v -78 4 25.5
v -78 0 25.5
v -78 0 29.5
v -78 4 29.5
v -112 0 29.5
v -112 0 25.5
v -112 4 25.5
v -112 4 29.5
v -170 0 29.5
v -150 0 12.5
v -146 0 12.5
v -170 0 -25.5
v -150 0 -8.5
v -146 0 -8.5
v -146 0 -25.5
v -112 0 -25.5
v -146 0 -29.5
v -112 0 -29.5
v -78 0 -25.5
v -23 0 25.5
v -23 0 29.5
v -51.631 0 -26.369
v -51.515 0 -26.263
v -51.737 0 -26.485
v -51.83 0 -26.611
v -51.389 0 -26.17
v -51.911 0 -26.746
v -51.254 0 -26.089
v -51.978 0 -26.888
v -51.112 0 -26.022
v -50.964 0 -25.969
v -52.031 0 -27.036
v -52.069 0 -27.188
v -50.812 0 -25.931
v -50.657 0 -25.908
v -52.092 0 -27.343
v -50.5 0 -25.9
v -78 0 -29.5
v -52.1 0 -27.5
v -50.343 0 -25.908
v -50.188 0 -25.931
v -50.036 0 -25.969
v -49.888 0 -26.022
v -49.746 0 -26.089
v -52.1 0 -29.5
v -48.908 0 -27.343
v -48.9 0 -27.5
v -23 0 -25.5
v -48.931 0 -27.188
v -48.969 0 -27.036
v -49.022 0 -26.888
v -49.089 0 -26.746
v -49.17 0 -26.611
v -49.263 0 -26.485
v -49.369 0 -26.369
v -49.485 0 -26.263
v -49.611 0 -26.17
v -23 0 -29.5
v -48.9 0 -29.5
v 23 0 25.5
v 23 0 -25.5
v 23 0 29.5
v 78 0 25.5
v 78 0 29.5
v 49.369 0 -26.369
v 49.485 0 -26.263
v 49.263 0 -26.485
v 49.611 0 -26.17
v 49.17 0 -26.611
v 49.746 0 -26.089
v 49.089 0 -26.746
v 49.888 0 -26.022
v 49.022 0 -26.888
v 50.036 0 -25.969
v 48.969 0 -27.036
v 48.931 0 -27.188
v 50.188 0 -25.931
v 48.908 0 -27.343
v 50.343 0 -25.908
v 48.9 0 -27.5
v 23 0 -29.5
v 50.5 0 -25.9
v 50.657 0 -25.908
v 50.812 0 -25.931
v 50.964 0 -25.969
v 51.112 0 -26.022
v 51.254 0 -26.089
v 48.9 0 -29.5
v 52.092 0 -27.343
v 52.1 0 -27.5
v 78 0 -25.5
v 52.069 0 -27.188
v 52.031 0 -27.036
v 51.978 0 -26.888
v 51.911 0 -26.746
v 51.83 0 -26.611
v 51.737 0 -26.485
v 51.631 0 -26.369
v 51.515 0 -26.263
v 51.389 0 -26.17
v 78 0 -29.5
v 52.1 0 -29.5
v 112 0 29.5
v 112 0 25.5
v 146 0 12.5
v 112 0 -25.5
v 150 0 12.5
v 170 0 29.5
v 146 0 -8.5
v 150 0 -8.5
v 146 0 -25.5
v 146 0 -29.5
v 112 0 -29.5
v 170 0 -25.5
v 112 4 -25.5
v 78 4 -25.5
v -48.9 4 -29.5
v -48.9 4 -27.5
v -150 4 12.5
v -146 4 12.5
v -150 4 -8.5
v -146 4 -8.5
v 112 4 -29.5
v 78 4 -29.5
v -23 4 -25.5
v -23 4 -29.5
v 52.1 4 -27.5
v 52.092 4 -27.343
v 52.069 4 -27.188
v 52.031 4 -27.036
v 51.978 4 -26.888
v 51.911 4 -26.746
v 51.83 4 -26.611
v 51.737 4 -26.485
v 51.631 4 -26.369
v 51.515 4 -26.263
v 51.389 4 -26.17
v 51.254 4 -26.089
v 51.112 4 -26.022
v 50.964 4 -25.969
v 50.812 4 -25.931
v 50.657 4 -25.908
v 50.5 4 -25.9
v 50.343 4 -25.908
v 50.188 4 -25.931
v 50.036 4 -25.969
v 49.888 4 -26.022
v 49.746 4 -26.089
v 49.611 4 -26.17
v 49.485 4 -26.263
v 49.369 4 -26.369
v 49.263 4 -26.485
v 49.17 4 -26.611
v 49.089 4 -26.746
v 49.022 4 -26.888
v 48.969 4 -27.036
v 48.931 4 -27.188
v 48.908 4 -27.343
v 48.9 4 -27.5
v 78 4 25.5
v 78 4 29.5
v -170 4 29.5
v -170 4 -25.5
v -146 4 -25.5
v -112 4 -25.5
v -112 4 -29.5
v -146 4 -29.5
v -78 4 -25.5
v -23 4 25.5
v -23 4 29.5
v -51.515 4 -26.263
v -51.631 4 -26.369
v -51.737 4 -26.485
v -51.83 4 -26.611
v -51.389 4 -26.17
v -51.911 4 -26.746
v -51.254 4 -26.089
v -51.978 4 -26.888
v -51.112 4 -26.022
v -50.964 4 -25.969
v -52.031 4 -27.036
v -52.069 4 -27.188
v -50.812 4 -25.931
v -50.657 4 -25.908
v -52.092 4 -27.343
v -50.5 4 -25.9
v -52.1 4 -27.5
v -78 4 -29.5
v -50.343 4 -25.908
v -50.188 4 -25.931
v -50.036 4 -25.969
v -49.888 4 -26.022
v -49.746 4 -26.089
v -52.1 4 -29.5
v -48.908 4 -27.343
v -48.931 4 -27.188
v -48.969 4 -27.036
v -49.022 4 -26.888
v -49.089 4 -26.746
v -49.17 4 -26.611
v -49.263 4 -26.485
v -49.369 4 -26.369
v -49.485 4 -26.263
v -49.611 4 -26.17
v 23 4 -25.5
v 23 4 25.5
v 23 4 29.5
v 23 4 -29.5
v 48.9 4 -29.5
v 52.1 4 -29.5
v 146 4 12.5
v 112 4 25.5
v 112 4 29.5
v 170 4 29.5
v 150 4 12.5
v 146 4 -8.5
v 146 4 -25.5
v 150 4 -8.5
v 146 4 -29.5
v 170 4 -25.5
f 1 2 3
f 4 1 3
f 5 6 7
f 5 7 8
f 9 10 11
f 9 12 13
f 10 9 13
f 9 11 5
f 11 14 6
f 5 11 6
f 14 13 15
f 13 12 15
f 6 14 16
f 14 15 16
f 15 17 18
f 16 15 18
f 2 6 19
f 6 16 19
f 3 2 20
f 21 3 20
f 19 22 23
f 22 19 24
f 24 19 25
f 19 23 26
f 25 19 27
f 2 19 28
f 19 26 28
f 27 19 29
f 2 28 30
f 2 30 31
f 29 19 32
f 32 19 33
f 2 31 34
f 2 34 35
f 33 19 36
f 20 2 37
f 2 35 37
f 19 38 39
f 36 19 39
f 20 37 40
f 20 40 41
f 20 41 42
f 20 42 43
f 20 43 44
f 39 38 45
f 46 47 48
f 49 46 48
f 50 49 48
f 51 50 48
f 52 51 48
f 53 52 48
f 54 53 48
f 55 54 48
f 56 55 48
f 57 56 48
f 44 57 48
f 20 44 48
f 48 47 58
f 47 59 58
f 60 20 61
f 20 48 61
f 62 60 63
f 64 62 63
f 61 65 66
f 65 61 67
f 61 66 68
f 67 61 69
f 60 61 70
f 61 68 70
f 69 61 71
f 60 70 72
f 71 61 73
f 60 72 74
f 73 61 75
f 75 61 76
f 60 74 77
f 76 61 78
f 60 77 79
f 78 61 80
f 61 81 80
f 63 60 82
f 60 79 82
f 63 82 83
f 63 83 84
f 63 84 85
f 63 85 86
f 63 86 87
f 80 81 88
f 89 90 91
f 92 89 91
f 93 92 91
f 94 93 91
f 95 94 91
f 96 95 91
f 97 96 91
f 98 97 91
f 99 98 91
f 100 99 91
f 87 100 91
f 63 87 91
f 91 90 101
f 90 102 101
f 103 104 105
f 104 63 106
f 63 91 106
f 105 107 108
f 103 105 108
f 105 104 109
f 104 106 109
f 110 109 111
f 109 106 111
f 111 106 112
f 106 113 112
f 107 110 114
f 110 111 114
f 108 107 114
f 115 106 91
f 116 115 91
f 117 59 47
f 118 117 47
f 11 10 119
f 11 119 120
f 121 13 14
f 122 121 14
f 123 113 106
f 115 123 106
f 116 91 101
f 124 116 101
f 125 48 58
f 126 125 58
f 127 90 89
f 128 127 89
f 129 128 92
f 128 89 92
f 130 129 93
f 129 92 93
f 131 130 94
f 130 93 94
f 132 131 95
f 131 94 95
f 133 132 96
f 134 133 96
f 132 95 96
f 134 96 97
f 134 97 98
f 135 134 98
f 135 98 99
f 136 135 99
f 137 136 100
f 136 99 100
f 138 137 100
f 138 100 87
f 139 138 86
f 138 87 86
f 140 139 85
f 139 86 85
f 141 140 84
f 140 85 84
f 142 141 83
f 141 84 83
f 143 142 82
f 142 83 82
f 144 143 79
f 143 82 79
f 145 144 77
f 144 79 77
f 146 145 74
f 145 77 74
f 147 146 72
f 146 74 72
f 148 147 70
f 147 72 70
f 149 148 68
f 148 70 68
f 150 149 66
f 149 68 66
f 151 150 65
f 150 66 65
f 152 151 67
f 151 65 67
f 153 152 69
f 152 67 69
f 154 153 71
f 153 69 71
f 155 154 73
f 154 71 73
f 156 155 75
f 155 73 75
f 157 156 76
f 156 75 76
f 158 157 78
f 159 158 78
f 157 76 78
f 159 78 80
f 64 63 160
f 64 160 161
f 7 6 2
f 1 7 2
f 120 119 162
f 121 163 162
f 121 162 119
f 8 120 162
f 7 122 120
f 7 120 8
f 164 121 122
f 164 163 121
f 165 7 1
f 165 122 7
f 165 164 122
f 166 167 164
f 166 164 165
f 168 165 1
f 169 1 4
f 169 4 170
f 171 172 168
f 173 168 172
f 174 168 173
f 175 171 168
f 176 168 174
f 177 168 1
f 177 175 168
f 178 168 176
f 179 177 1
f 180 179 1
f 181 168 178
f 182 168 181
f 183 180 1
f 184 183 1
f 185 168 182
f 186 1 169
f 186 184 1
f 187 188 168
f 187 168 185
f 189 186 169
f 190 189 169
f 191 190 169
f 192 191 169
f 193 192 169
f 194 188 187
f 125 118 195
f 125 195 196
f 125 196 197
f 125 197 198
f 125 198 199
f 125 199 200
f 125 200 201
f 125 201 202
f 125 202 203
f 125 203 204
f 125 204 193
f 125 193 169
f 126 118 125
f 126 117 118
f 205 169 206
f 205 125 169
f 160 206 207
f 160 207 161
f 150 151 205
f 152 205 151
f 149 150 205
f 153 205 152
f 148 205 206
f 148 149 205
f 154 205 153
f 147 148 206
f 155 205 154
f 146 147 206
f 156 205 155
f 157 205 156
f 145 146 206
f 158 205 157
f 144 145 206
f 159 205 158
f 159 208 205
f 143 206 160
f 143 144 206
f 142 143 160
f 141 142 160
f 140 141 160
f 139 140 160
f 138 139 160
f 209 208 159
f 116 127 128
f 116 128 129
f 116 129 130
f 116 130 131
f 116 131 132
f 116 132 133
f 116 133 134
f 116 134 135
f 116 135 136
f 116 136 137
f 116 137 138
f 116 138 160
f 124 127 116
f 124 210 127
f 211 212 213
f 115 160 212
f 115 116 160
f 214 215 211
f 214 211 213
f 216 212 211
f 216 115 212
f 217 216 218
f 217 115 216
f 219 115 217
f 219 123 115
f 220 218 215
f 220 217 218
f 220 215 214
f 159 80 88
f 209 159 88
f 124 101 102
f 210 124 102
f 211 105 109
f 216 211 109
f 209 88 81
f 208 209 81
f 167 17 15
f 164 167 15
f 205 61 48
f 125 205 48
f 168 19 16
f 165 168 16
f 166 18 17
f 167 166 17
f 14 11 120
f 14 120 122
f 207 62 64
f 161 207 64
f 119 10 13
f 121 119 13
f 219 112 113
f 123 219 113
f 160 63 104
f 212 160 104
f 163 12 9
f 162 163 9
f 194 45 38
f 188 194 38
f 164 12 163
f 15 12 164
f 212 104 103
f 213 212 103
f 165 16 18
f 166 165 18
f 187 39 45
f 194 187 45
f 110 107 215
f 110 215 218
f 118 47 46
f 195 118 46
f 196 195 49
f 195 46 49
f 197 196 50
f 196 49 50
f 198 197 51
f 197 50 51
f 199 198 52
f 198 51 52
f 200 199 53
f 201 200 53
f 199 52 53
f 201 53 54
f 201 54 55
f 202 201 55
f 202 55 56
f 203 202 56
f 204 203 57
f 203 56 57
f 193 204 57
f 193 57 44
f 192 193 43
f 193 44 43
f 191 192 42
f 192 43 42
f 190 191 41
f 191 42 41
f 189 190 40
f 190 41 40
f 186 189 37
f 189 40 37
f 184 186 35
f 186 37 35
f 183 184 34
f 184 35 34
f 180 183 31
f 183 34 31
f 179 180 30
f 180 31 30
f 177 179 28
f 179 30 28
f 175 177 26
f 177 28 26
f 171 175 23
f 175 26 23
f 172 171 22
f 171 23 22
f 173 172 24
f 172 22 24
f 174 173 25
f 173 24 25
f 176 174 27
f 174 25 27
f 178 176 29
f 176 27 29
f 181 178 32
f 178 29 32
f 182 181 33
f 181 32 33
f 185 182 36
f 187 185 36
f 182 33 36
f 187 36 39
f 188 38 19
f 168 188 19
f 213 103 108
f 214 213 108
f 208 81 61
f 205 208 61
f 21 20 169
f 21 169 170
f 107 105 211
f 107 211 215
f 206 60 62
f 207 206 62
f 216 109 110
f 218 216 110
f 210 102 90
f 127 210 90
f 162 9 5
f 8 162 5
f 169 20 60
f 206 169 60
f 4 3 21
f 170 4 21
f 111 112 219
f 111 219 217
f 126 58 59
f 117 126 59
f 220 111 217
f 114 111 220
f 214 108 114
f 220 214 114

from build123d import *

# Parameters (mm, degrees)
SKETCH1_W           = 4
SKETCH1_H           = 21
BOSS_EXTRUDE1_DEPTH = 4
CUT_EXTRUDE1_REACH  = 174.587
SKETCH3_W           = 34
SKETCH3_H           = 4
SKETCH3_W_2         = 46
SKETCH3_W_3         = 24


with BuildPart() as part:
    # Sketch1 → Boss-Extrude1 (new body)
    with BuildSketch(Plane(origin=(0, 0, 0), x_dir=(1, 0, 0), z_dir=(0, 1, 0))):
        with BuildLine():
            Line((-170, -29.5), (170, -29.5))
            Line((170, -29.5), (170, 29.5))
            Line((170, 29.5), (112, 29.5))
            Line((112, 29.5), (112, 25.5))
            Line((112, 25.5), (78, 25.5))
            Line((78, 25.5), (78, 29.5))
            Line((78, 29.5), (52.1, 29.5))
            Line((52.1, 29.5), (52.1, 27.5))
            ThreePointArc((52.1, 27.5), (50.5, 25.9), (48.9, 27.5))
            Line((48.9, 27.5), (48.9, 29.5))
            Line((48.9, 29.5), (23, 29.5))
            Line((23, 29.5), (23, 25.5))
            Line((23, 25.5), (-23, 25.5))
            Line((-23, 25.5), (-23, 29.5))
            Line((-23, 29.5), (-48.9, 29.5))
            Line((-48.9, 29.5), (-48.9, 27.5))
            ThreePointArc((-48.9, 27.5), (-50.5, 25.9), (-52.1, 27.5))
            Line((-52.1, 27.5), (-52.1, 29.5))
            Line((-52.1, 29.5), (-78, 29.5))
            Line((-78, 29.5), (-78, 25.5))
            Line((-78, 25.5), (-112, 25.5))
            Line((-112, 25.5), (-112, 29.5))
            Line((-112, 29.5), (-170, 29.5))
            Line((-170, 29.5), (-170, -29.5))
        make_face()
        with Locations((-148, -2)):
            Rectangle(SKETCH1_W, SKETCH1_H, mode=Mode.SUBTRACT)
        with Locations((148, -2)):
            Rectangle(SKETCH1_W, SKETCH1_H, mode=Mode.SUBTRACT)
    extrude(amount=BOSS_EXTRUDE1_DEPTH)

    # Sketch3 → Cut-Extrude1 (cut, up to next)
    with BuildSketch(Plane.XZ, mode=Mode.PRIVATE) as cut_extrude1_sk1:
        with Locations((-95, 27.5)):
            Rectangle(SKETCH3_W, SKETCH3_H)
    cut_extrude1_tool1 = extrude(cut_extrude1_sk1.sketch, amount=-CUT_EXTRUDE1_REACH, mode=Mode.PRIVATE) & part.part
    # Sketch3 → Cut-Extrude1 (cut, up to next)
    with BuildSketch(Plane.XZ, mode=Mode.PRIVATE) as cut_extrude1_sk2:
        with Locations((0, 27.5)):
            Rectangle(SKETCH3_W_2, SKETCH3_H)
    cut_extrude1_tool2 = extrude(cut_extrude1_sk2.sketch, amount=-CUT_EXTRUDE1_REACH, mode=Mode.PRIVATE) & part.part
    # Sketch3 → Cut-Extrude1 (cut, up to next)
    with BuildSketch(Plane.XZ, mode=Mode.PRIVATE) as cut_extrude1_sk3:
        with Locations((95, 27.5)):
            Rectangle(SKETCH3_W, SKETCH3_H)
    cut_extrude1_tool3 = extrude(cut_extrude1_sk3.sketch, amount=-CUT_EXTRUDE1_REACH, mode=Mode.PRIVATE) & part.part
    # Sketch3 → Cut-Extrude1 (cut, up to next)
    with BuildSketch(Plane.XZ, mode=Mode.PRIVATE) as cut_extrude1_sk4:
        with Locations((-158, -27.5)):
            Rectangle(SKETCH3_W_3, SKETCH3_H)
    cut_extrude1_tool4 = extrude(cut_extrude1_sk4.sketch, amount=-CUT_EXTRUDE1_REACH, mode=Mode.PRIVATE) & part.part
    # Sketch3 → Cut-Extrude1 (cut, up to next)
    with BuildSketch(Plane.XZ, mode=Mode.PRIVATE) as cut_extrude1_sk5:
        with Locations((158, -27.5)):
            Rectangle(SKETCH3_W_3, SKETCH3_H)
    cut_extrude1_tool5 = extrude(cut_extrude1_sk5.sketch, amount=-CUT_EXTRUDE1_REACH, mode=Mode.PRIVATE) & part.part
    add(cut_extrude1_tool1.solids().sort_by_distance((-95, 0, 27.5))[0], mode=Mode.SUBTRACT)
    add(cut_extrude1_tool2.solids().sort_by_distance((0, 0, 27.5))[0], mode=Mode.SUBTRACT)
    add(cut_extrude1_tool3.solids().sort_by_distance((95, 0, 27.5))[0], mode=Mode.SUBTRACT)
    add(cut_extrude1_tool4.solids().sort_by_distance((-158, 0, -27.5))[0], mode=Mode.SUBTRACT)
    add(cut_extrude1_tool5.solids().sort_by_distance((158, 0, -27.5))[0], mode=Mode.SUBTRACT)


solid = part.part
